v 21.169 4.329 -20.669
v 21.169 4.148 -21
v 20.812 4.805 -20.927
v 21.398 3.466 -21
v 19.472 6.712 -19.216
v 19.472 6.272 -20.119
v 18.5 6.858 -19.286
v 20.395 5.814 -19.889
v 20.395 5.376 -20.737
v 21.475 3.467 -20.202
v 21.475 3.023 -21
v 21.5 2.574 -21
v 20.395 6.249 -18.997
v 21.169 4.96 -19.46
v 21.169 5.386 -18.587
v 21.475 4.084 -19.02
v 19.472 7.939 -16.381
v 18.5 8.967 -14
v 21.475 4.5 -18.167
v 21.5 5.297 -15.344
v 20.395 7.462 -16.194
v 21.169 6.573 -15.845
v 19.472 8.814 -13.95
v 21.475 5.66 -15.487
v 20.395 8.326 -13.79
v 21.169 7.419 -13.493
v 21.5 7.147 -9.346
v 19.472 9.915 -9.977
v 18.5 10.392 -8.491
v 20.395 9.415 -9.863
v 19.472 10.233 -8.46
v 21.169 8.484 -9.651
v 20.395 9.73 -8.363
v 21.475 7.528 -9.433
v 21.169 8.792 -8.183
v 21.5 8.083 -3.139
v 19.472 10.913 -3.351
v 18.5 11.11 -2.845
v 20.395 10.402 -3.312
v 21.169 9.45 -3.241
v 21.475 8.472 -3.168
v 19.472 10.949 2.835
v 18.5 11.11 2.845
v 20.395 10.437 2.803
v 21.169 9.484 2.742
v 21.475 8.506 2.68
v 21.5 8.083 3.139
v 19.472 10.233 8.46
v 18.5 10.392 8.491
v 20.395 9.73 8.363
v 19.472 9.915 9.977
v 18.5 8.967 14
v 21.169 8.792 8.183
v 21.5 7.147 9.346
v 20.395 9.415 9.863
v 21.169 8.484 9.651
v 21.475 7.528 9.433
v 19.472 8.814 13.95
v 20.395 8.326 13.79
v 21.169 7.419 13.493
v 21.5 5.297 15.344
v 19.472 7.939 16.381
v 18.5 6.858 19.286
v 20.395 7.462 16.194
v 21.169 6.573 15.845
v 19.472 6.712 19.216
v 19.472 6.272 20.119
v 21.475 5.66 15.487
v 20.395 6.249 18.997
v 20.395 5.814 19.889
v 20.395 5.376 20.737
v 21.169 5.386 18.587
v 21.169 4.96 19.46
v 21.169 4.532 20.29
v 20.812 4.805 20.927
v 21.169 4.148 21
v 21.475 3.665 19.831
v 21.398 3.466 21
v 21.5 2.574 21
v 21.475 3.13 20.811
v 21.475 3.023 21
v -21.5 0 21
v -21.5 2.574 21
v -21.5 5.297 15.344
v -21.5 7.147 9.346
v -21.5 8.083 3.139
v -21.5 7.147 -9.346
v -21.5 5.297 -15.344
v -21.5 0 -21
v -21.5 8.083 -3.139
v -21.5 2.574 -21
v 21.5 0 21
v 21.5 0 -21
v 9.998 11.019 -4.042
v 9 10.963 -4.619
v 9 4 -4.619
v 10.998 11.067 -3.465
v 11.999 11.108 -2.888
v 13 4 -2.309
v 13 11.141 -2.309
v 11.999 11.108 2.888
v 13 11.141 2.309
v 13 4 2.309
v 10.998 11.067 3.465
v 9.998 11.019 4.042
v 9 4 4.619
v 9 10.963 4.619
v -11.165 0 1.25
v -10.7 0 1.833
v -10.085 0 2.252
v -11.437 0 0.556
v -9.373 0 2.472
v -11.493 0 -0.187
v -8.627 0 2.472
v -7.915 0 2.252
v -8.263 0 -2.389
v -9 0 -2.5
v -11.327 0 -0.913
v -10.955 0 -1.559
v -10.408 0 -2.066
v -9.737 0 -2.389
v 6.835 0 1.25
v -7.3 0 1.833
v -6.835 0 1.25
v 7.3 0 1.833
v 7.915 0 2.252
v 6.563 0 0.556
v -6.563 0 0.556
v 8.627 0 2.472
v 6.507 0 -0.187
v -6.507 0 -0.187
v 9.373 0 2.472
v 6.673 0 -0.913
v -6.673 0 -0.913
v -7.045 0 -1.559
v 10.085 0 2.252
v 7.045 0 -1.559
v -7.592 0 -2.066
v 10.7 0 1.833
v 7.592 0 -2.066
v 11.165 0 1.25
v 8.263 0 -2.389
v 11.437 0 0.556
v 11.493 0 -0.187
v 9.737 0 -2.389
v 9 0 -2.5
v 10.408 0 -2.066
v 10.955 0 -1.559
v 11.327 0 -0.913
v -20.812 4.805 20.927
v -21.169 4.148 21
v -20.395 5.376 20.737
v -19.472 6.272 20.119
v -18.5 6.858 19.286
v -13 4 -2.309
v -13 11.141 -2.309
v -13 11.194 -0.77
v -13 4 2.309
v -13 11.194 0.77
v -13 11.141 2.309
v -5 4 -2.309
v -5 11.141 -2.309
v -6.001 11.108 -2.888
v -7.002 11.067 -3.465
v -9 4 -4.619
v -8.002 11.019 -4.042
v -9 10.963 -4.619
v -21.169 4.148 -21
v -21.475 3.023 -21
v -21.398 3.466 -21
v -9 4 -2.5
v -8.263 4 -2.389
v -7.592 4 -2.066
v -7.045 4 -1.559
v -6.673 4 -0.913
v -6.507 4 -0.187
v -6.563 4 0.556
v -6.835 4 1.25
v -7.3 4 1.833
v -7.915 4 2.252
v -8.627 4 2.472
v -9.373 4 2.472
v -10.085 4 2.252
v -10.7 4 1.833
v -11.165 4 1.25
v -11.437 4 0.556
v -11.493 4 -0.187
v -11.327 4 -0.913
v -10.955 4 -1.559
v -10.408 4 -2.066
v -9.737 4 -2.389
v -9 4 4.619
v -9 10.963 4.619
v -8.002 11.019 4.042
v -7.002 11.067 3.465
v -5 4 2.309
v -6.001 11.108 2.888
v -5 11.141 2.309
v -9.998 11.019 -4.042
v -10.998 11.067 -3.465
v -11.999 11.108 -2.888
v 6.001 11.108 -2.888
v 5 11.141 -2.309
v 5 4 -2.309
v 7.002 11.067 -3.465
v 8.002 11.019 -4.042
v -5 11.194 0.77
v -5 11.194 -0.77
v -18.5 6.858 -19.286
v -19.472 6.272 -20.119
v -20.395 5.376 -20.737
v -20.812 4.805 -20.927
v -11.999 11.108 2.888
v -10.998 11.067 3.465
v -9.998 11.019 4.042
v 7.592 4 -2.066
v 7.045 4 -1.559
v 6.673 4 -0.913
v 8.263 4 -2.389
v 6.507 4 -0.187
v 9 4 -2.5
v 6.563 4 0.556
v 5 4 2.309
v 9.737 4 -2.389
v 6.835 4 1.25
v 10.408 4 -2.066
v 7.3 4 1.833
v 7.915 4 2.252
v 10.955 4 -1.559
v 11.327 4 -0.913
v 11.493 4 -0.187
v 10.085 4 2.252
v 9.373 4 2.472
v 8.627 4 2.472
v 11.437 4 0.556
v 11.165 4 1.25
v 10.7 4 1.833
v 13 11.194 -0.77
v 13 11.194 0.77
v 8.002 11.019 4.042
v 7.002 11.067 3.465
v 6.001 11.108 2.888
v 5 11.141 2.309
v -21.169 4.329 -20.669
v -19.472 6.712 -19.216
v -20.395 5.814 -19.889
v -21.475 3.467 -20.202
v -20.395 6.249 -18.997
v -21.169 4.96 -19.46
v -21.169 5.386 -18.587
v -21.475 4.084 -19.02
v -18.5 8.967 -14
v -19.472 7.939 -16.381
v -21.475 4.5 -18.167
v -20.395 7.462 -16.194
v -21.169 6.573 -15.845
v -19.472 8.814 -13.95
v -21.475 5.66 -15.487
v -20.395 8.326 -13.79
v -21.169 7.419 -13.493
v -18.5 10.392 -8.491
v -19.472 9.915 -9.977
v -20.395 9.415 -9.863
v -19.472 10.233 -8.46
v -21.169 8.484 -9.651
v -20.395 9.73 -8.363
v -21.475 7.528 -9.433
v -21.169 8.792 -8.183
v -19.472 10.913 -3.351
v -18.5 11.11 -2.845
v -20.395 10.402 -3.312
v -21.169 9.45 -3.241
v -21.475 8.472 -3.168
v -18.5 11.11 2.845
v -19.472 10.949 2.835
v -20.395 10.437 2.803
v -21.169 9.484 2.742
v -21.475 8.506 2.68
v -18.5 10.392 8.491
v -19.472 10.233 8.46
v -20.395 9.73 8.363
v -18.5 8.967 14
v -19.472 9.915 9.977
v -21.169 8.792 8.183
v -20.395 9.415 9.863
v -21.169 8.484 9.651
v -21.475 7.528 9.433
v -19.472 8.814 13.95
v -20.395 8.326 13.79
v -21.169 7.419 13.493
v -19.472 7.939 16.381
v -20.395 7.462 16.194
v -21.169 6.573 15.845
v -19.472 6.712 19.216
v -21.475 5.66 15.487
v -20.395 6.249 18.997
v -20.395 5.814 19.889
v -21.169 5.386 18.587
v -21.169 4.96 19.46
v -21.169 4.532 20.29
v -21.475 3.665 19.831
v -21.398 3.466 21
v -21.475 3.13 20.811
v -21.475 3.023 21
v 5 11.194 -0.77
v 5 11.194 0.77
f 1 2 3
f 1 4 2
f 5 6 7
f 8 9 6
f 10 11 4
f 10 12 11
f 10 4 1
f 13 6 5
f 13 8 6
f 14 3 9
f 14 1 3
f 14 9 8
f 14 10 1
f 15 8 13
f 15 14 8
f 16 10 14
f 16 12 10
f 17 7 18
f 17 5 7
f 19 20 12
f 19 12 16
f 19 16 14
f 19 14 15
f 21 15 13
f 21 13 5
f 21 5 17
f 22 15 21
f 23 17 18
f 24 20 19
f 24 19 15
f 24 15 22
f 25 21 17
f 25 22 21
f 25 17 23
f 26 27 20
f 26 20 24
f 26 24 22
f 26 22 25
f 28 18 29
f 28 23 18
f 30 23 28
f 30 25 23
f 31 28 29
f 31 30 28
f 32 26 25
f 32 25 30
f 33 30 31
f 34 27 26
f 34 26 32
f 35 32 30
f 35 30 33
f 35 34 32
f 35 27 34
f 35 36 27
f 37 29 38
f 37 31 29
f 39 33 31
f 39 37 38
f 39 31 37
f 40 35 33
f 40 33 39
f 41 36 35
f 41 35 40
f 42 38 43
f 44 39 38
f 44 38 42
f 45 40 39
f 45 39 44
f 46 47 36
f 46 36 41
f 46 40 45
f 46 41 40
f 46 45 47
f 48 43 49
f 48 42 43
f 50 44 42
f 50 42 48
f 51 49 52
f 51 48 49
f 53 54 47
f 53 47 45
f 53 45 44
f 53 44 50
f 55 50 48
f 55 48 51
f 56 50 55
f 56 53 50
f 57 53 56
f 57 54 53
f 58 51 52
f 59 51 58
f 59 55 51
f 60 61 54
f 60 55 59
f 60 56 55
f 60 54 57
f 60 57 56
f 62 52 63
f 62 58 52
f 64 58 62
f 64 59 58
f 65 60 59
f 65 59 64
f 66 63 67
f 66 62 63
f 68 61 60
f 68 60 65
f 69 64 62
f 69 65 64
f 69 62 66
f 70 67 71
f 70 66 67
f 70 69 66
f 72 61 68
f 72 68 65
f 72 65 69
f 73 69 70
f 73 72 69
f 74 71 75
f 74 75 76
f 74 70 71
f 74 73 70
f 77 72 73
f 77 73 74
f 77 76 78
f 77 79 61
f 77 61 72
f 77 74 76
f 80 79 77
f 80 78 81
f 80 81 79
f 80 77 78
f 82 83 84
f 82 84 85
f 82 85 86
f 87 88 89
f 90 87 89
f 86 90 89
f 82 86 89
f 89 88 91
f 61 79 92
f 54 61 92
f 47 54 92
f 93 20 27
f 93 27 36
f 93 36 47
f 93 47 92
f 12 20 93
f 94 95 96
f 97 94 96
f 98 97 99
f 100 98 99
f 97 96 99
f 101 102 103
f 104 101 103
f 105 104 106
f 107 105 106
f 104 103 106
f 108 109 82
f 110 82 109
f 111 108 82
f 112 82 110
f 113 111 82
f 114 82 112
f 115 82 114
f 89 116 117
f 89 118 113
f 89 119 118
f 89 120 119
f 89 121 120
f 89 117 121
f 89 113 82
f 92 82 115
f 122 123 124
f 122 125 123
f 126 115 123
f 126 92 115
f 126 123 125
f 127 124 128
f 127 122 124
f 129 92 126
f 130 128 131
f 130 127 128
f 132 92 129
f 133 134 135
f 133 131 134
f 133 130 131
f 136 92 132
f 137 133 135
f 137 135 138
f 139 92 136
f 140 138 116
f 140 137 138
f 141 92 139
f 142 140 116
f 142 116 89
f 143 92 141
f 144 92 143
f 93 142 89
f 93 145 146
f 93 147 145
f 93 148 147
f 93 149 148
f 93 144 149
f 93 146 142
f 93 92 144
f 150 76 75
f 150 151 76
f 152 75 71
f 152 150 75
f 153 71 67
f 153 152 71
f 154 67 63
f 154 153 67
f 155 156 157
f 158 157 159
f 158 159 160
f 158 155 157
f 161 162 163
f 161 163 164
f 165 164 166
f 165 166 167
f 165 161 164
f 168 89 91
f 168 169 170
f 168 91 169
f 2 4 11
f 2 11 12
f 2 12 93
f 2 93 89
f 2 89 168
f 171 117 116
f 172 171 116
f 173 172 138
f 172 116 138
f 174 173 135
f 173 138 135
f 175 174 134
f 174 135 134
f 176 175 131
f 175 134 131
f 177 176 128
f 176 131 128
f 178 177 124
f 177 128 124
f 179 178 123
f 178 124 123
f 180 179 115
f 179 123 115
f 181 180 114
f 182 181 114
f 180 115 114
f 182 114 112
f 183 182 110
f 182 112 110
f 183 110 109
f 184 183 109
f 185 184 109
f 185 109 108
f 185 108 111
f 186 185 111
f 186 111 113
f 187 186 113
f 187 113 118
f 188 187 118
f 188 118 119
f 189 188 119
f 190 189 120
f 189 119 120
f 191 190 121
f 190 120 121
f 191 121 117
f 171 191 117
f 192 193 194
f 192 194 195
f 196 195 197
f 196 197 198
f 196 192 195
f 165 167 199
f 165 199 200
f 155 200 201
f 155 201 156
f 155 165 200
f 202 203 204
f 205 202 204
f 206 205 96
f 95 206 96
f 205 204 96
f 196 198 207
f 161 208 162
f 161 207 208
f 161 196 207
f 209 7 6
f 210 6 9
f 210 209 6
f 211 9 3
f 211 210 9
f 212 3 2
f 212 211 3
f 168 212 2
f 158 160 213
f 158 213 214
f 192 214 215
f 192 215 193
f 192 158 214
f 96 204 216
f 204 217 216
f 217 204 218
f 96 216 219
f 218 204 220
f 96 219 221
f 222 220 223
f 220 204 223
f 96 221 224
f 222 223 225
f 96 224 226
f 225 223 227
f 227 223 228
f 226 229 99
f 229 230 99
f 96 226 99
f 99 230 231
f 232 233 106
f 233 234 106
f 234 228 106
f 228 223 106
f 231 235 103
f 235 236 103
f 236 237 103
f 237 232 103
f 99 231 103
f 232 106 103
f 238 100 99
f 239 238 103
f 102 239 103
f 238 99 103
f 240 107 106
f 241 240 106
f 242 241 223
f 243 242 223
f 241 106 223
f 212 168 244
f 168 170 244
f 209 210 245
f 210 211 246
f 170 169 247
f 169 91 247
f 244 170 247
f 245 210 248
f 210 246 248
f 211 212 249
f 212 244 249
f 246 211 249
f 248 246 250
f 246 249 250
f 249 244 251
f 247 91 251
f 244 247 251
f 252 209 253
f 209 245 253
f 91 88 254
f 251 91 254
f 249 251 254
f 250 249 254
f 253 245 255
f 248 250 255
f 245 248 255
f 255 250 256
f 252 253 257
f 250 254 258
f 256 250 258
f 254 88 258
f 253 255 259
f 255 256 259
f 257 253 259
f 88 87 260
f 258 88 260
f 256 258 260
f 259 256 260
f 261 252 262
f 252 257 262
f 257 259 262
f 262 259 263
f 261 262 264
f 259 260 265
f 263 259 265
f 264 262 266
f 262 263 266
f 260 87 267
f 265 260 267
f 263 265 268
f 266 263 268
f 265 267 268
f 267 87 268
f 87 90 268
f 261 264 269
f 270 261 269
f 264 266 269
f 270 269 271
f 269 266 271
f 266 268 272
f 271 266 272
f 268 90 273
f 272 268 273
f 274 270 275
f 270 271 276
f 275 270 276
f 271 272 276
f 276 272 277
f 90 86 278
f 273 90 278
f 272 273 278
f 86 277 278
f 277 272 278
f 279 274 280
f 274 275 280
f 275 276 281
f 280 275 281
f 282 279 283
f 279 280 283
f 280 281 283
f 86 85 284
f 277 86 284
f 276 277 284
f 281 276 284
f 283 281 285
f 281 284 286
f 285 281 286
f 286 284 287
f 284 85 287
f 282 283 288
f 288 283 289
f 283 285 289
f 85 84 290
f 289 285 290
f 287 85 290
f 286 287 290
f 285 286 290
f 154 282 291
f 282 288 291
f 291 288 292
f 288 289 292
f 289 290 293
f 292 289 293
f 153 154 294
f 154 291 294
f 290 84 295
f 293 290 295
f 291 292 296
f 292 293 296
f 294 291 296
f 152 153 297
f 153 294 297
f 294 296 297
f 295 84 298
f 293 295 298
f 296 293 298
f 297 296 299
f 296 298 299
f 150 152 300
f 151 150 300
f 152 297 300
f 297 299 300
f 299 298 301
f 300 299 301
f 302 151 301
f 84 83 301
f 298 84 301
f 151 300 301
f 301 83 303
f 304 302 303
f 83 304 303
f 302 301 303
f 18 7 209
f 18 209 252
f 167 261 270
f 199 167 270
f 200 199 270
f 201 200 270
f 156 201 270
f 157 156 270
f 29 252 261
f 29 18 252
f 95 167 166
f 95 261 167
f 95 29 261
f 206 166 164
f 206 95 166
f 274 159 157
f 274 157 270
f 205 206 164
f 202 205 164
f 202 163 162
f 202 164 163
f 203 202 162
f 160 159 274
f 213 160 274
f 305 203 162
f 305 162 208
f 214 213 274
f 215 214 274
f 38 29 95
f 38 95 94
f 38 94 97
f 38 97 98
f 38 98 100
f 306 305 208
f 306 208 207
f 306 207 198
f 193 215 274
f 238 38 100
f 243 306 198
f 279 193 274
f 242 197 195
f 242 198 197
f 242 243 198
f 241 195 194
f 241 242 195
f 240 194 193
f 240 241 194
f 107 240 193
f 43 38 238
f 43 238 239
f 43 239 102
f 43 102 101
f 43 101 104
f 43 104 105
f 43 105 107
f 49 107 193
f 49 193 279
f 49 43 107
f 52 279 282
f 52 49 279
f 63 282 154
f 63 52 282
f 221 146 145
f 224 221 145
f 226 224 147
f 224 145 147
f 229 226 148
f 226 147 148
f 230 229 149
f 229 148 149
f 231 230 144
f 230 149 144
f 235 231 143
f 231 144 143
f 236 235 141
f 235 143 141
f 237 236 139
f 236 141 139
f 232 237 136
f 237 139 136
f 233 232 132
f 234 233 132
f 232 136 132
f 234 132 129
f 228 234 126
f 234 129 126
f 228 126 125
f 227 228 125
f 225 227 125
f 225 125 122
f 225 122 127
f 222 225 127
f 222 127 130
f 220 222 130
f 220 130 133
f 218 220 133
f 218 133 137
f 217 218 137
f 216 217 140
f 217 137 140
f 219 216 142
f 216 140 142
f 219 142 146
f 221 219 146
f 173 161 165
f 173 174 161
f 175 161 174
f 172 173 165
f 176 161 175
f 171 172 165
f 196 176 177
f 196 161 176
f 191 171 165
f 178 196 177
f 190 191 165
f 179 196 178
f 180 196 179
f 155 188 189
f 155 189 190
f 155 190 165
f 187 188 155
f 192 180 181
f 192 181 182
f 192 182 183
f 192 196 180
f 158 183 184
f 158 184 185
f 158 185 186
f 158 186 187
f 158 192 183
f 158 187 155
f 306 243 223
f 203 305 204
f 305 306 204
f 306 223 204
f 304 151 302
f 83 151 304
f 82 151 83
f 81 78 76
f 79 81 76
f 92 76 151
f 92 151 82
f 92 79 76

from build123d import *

# Parameters (mm, degrees)
BOSS_EXTRUDE1_DEPTH = 21.5
FILLET1_R           = 3
CUT_EXTRUDE1_START  = -4
CUT_EXTRUDE1_DEPTH  = 29.073373183
SKETCH4_R           = 2.5
CUT_EXTRUDE2_DEPTH  = 4


with BuildPart() as part:
    # Sketch2 → Boss-Extrude1 (new, symmetric)
    with BuildSketch(Plane(origin=(0, 0, 0), x_dir=(0, 0, -1), z_dir=(1, 0, 0))):
        with BuildLine():
            Line((-21, 6), (-21, 0))
            Line((-21, 0), (21, 0))
            Line((21, 0), (21, 6))
            ThreePointArc((21, 6), (0, 11.200502516), (-21, 6))
        make_face()
    extrude(amount=BOSS_EXTRUDE1_DEPTH, both=True)

    # Fillet1
    fillet1_edges = [part.edges().sort_by_distance(p)[0] for p in [
        (21.5, 11.200502516, 0),
        (-21.5, 11.200502516, 0),
        (0, 6, -21),
        (0, 6, 21),
    ]]
    fillet(fillet1_edges, radius=FILLET1_R)

    # Sketch3 → Cut-Extrude1 (cut, through all)
    with BuildSketch(Plane.XZ.offset(CUT_EXTRUDE1_START)):
        Polygon((5, 2.309401077), (5, -2.309401077), (9, -4.618802154), (13, -2.309401077), (13, 2.309401077), (9, 4.618802154), align=None)
        Polygon((-9, 4.618802154), (-5, 2.309401077), (-5, -2.309401077), (-9, -4.618802154), (-13, -2.309401077), (-13, 2.309401077), align=None)
    extrude(amount=-CUT_EXTRUDE1_DEPTH, mode=Mode.SUBTRACT)

    # Sketch4 → Cut-Extrude2 (cut)
    with BuildSketch(Plane.XZ):
        with Locations(Location((9, 0, 0), (0, 0, 270))):
            Circle(SKETCH4_R)
        with Locations(Location((-9, 0, 0), (0, 0, 270))):
            Circle(SKETCH4_R)
    extrude(amount=-CUT_EXTRUDE2_DEPTH, mode=Mode.SUBTRACT)


solid = part.part
